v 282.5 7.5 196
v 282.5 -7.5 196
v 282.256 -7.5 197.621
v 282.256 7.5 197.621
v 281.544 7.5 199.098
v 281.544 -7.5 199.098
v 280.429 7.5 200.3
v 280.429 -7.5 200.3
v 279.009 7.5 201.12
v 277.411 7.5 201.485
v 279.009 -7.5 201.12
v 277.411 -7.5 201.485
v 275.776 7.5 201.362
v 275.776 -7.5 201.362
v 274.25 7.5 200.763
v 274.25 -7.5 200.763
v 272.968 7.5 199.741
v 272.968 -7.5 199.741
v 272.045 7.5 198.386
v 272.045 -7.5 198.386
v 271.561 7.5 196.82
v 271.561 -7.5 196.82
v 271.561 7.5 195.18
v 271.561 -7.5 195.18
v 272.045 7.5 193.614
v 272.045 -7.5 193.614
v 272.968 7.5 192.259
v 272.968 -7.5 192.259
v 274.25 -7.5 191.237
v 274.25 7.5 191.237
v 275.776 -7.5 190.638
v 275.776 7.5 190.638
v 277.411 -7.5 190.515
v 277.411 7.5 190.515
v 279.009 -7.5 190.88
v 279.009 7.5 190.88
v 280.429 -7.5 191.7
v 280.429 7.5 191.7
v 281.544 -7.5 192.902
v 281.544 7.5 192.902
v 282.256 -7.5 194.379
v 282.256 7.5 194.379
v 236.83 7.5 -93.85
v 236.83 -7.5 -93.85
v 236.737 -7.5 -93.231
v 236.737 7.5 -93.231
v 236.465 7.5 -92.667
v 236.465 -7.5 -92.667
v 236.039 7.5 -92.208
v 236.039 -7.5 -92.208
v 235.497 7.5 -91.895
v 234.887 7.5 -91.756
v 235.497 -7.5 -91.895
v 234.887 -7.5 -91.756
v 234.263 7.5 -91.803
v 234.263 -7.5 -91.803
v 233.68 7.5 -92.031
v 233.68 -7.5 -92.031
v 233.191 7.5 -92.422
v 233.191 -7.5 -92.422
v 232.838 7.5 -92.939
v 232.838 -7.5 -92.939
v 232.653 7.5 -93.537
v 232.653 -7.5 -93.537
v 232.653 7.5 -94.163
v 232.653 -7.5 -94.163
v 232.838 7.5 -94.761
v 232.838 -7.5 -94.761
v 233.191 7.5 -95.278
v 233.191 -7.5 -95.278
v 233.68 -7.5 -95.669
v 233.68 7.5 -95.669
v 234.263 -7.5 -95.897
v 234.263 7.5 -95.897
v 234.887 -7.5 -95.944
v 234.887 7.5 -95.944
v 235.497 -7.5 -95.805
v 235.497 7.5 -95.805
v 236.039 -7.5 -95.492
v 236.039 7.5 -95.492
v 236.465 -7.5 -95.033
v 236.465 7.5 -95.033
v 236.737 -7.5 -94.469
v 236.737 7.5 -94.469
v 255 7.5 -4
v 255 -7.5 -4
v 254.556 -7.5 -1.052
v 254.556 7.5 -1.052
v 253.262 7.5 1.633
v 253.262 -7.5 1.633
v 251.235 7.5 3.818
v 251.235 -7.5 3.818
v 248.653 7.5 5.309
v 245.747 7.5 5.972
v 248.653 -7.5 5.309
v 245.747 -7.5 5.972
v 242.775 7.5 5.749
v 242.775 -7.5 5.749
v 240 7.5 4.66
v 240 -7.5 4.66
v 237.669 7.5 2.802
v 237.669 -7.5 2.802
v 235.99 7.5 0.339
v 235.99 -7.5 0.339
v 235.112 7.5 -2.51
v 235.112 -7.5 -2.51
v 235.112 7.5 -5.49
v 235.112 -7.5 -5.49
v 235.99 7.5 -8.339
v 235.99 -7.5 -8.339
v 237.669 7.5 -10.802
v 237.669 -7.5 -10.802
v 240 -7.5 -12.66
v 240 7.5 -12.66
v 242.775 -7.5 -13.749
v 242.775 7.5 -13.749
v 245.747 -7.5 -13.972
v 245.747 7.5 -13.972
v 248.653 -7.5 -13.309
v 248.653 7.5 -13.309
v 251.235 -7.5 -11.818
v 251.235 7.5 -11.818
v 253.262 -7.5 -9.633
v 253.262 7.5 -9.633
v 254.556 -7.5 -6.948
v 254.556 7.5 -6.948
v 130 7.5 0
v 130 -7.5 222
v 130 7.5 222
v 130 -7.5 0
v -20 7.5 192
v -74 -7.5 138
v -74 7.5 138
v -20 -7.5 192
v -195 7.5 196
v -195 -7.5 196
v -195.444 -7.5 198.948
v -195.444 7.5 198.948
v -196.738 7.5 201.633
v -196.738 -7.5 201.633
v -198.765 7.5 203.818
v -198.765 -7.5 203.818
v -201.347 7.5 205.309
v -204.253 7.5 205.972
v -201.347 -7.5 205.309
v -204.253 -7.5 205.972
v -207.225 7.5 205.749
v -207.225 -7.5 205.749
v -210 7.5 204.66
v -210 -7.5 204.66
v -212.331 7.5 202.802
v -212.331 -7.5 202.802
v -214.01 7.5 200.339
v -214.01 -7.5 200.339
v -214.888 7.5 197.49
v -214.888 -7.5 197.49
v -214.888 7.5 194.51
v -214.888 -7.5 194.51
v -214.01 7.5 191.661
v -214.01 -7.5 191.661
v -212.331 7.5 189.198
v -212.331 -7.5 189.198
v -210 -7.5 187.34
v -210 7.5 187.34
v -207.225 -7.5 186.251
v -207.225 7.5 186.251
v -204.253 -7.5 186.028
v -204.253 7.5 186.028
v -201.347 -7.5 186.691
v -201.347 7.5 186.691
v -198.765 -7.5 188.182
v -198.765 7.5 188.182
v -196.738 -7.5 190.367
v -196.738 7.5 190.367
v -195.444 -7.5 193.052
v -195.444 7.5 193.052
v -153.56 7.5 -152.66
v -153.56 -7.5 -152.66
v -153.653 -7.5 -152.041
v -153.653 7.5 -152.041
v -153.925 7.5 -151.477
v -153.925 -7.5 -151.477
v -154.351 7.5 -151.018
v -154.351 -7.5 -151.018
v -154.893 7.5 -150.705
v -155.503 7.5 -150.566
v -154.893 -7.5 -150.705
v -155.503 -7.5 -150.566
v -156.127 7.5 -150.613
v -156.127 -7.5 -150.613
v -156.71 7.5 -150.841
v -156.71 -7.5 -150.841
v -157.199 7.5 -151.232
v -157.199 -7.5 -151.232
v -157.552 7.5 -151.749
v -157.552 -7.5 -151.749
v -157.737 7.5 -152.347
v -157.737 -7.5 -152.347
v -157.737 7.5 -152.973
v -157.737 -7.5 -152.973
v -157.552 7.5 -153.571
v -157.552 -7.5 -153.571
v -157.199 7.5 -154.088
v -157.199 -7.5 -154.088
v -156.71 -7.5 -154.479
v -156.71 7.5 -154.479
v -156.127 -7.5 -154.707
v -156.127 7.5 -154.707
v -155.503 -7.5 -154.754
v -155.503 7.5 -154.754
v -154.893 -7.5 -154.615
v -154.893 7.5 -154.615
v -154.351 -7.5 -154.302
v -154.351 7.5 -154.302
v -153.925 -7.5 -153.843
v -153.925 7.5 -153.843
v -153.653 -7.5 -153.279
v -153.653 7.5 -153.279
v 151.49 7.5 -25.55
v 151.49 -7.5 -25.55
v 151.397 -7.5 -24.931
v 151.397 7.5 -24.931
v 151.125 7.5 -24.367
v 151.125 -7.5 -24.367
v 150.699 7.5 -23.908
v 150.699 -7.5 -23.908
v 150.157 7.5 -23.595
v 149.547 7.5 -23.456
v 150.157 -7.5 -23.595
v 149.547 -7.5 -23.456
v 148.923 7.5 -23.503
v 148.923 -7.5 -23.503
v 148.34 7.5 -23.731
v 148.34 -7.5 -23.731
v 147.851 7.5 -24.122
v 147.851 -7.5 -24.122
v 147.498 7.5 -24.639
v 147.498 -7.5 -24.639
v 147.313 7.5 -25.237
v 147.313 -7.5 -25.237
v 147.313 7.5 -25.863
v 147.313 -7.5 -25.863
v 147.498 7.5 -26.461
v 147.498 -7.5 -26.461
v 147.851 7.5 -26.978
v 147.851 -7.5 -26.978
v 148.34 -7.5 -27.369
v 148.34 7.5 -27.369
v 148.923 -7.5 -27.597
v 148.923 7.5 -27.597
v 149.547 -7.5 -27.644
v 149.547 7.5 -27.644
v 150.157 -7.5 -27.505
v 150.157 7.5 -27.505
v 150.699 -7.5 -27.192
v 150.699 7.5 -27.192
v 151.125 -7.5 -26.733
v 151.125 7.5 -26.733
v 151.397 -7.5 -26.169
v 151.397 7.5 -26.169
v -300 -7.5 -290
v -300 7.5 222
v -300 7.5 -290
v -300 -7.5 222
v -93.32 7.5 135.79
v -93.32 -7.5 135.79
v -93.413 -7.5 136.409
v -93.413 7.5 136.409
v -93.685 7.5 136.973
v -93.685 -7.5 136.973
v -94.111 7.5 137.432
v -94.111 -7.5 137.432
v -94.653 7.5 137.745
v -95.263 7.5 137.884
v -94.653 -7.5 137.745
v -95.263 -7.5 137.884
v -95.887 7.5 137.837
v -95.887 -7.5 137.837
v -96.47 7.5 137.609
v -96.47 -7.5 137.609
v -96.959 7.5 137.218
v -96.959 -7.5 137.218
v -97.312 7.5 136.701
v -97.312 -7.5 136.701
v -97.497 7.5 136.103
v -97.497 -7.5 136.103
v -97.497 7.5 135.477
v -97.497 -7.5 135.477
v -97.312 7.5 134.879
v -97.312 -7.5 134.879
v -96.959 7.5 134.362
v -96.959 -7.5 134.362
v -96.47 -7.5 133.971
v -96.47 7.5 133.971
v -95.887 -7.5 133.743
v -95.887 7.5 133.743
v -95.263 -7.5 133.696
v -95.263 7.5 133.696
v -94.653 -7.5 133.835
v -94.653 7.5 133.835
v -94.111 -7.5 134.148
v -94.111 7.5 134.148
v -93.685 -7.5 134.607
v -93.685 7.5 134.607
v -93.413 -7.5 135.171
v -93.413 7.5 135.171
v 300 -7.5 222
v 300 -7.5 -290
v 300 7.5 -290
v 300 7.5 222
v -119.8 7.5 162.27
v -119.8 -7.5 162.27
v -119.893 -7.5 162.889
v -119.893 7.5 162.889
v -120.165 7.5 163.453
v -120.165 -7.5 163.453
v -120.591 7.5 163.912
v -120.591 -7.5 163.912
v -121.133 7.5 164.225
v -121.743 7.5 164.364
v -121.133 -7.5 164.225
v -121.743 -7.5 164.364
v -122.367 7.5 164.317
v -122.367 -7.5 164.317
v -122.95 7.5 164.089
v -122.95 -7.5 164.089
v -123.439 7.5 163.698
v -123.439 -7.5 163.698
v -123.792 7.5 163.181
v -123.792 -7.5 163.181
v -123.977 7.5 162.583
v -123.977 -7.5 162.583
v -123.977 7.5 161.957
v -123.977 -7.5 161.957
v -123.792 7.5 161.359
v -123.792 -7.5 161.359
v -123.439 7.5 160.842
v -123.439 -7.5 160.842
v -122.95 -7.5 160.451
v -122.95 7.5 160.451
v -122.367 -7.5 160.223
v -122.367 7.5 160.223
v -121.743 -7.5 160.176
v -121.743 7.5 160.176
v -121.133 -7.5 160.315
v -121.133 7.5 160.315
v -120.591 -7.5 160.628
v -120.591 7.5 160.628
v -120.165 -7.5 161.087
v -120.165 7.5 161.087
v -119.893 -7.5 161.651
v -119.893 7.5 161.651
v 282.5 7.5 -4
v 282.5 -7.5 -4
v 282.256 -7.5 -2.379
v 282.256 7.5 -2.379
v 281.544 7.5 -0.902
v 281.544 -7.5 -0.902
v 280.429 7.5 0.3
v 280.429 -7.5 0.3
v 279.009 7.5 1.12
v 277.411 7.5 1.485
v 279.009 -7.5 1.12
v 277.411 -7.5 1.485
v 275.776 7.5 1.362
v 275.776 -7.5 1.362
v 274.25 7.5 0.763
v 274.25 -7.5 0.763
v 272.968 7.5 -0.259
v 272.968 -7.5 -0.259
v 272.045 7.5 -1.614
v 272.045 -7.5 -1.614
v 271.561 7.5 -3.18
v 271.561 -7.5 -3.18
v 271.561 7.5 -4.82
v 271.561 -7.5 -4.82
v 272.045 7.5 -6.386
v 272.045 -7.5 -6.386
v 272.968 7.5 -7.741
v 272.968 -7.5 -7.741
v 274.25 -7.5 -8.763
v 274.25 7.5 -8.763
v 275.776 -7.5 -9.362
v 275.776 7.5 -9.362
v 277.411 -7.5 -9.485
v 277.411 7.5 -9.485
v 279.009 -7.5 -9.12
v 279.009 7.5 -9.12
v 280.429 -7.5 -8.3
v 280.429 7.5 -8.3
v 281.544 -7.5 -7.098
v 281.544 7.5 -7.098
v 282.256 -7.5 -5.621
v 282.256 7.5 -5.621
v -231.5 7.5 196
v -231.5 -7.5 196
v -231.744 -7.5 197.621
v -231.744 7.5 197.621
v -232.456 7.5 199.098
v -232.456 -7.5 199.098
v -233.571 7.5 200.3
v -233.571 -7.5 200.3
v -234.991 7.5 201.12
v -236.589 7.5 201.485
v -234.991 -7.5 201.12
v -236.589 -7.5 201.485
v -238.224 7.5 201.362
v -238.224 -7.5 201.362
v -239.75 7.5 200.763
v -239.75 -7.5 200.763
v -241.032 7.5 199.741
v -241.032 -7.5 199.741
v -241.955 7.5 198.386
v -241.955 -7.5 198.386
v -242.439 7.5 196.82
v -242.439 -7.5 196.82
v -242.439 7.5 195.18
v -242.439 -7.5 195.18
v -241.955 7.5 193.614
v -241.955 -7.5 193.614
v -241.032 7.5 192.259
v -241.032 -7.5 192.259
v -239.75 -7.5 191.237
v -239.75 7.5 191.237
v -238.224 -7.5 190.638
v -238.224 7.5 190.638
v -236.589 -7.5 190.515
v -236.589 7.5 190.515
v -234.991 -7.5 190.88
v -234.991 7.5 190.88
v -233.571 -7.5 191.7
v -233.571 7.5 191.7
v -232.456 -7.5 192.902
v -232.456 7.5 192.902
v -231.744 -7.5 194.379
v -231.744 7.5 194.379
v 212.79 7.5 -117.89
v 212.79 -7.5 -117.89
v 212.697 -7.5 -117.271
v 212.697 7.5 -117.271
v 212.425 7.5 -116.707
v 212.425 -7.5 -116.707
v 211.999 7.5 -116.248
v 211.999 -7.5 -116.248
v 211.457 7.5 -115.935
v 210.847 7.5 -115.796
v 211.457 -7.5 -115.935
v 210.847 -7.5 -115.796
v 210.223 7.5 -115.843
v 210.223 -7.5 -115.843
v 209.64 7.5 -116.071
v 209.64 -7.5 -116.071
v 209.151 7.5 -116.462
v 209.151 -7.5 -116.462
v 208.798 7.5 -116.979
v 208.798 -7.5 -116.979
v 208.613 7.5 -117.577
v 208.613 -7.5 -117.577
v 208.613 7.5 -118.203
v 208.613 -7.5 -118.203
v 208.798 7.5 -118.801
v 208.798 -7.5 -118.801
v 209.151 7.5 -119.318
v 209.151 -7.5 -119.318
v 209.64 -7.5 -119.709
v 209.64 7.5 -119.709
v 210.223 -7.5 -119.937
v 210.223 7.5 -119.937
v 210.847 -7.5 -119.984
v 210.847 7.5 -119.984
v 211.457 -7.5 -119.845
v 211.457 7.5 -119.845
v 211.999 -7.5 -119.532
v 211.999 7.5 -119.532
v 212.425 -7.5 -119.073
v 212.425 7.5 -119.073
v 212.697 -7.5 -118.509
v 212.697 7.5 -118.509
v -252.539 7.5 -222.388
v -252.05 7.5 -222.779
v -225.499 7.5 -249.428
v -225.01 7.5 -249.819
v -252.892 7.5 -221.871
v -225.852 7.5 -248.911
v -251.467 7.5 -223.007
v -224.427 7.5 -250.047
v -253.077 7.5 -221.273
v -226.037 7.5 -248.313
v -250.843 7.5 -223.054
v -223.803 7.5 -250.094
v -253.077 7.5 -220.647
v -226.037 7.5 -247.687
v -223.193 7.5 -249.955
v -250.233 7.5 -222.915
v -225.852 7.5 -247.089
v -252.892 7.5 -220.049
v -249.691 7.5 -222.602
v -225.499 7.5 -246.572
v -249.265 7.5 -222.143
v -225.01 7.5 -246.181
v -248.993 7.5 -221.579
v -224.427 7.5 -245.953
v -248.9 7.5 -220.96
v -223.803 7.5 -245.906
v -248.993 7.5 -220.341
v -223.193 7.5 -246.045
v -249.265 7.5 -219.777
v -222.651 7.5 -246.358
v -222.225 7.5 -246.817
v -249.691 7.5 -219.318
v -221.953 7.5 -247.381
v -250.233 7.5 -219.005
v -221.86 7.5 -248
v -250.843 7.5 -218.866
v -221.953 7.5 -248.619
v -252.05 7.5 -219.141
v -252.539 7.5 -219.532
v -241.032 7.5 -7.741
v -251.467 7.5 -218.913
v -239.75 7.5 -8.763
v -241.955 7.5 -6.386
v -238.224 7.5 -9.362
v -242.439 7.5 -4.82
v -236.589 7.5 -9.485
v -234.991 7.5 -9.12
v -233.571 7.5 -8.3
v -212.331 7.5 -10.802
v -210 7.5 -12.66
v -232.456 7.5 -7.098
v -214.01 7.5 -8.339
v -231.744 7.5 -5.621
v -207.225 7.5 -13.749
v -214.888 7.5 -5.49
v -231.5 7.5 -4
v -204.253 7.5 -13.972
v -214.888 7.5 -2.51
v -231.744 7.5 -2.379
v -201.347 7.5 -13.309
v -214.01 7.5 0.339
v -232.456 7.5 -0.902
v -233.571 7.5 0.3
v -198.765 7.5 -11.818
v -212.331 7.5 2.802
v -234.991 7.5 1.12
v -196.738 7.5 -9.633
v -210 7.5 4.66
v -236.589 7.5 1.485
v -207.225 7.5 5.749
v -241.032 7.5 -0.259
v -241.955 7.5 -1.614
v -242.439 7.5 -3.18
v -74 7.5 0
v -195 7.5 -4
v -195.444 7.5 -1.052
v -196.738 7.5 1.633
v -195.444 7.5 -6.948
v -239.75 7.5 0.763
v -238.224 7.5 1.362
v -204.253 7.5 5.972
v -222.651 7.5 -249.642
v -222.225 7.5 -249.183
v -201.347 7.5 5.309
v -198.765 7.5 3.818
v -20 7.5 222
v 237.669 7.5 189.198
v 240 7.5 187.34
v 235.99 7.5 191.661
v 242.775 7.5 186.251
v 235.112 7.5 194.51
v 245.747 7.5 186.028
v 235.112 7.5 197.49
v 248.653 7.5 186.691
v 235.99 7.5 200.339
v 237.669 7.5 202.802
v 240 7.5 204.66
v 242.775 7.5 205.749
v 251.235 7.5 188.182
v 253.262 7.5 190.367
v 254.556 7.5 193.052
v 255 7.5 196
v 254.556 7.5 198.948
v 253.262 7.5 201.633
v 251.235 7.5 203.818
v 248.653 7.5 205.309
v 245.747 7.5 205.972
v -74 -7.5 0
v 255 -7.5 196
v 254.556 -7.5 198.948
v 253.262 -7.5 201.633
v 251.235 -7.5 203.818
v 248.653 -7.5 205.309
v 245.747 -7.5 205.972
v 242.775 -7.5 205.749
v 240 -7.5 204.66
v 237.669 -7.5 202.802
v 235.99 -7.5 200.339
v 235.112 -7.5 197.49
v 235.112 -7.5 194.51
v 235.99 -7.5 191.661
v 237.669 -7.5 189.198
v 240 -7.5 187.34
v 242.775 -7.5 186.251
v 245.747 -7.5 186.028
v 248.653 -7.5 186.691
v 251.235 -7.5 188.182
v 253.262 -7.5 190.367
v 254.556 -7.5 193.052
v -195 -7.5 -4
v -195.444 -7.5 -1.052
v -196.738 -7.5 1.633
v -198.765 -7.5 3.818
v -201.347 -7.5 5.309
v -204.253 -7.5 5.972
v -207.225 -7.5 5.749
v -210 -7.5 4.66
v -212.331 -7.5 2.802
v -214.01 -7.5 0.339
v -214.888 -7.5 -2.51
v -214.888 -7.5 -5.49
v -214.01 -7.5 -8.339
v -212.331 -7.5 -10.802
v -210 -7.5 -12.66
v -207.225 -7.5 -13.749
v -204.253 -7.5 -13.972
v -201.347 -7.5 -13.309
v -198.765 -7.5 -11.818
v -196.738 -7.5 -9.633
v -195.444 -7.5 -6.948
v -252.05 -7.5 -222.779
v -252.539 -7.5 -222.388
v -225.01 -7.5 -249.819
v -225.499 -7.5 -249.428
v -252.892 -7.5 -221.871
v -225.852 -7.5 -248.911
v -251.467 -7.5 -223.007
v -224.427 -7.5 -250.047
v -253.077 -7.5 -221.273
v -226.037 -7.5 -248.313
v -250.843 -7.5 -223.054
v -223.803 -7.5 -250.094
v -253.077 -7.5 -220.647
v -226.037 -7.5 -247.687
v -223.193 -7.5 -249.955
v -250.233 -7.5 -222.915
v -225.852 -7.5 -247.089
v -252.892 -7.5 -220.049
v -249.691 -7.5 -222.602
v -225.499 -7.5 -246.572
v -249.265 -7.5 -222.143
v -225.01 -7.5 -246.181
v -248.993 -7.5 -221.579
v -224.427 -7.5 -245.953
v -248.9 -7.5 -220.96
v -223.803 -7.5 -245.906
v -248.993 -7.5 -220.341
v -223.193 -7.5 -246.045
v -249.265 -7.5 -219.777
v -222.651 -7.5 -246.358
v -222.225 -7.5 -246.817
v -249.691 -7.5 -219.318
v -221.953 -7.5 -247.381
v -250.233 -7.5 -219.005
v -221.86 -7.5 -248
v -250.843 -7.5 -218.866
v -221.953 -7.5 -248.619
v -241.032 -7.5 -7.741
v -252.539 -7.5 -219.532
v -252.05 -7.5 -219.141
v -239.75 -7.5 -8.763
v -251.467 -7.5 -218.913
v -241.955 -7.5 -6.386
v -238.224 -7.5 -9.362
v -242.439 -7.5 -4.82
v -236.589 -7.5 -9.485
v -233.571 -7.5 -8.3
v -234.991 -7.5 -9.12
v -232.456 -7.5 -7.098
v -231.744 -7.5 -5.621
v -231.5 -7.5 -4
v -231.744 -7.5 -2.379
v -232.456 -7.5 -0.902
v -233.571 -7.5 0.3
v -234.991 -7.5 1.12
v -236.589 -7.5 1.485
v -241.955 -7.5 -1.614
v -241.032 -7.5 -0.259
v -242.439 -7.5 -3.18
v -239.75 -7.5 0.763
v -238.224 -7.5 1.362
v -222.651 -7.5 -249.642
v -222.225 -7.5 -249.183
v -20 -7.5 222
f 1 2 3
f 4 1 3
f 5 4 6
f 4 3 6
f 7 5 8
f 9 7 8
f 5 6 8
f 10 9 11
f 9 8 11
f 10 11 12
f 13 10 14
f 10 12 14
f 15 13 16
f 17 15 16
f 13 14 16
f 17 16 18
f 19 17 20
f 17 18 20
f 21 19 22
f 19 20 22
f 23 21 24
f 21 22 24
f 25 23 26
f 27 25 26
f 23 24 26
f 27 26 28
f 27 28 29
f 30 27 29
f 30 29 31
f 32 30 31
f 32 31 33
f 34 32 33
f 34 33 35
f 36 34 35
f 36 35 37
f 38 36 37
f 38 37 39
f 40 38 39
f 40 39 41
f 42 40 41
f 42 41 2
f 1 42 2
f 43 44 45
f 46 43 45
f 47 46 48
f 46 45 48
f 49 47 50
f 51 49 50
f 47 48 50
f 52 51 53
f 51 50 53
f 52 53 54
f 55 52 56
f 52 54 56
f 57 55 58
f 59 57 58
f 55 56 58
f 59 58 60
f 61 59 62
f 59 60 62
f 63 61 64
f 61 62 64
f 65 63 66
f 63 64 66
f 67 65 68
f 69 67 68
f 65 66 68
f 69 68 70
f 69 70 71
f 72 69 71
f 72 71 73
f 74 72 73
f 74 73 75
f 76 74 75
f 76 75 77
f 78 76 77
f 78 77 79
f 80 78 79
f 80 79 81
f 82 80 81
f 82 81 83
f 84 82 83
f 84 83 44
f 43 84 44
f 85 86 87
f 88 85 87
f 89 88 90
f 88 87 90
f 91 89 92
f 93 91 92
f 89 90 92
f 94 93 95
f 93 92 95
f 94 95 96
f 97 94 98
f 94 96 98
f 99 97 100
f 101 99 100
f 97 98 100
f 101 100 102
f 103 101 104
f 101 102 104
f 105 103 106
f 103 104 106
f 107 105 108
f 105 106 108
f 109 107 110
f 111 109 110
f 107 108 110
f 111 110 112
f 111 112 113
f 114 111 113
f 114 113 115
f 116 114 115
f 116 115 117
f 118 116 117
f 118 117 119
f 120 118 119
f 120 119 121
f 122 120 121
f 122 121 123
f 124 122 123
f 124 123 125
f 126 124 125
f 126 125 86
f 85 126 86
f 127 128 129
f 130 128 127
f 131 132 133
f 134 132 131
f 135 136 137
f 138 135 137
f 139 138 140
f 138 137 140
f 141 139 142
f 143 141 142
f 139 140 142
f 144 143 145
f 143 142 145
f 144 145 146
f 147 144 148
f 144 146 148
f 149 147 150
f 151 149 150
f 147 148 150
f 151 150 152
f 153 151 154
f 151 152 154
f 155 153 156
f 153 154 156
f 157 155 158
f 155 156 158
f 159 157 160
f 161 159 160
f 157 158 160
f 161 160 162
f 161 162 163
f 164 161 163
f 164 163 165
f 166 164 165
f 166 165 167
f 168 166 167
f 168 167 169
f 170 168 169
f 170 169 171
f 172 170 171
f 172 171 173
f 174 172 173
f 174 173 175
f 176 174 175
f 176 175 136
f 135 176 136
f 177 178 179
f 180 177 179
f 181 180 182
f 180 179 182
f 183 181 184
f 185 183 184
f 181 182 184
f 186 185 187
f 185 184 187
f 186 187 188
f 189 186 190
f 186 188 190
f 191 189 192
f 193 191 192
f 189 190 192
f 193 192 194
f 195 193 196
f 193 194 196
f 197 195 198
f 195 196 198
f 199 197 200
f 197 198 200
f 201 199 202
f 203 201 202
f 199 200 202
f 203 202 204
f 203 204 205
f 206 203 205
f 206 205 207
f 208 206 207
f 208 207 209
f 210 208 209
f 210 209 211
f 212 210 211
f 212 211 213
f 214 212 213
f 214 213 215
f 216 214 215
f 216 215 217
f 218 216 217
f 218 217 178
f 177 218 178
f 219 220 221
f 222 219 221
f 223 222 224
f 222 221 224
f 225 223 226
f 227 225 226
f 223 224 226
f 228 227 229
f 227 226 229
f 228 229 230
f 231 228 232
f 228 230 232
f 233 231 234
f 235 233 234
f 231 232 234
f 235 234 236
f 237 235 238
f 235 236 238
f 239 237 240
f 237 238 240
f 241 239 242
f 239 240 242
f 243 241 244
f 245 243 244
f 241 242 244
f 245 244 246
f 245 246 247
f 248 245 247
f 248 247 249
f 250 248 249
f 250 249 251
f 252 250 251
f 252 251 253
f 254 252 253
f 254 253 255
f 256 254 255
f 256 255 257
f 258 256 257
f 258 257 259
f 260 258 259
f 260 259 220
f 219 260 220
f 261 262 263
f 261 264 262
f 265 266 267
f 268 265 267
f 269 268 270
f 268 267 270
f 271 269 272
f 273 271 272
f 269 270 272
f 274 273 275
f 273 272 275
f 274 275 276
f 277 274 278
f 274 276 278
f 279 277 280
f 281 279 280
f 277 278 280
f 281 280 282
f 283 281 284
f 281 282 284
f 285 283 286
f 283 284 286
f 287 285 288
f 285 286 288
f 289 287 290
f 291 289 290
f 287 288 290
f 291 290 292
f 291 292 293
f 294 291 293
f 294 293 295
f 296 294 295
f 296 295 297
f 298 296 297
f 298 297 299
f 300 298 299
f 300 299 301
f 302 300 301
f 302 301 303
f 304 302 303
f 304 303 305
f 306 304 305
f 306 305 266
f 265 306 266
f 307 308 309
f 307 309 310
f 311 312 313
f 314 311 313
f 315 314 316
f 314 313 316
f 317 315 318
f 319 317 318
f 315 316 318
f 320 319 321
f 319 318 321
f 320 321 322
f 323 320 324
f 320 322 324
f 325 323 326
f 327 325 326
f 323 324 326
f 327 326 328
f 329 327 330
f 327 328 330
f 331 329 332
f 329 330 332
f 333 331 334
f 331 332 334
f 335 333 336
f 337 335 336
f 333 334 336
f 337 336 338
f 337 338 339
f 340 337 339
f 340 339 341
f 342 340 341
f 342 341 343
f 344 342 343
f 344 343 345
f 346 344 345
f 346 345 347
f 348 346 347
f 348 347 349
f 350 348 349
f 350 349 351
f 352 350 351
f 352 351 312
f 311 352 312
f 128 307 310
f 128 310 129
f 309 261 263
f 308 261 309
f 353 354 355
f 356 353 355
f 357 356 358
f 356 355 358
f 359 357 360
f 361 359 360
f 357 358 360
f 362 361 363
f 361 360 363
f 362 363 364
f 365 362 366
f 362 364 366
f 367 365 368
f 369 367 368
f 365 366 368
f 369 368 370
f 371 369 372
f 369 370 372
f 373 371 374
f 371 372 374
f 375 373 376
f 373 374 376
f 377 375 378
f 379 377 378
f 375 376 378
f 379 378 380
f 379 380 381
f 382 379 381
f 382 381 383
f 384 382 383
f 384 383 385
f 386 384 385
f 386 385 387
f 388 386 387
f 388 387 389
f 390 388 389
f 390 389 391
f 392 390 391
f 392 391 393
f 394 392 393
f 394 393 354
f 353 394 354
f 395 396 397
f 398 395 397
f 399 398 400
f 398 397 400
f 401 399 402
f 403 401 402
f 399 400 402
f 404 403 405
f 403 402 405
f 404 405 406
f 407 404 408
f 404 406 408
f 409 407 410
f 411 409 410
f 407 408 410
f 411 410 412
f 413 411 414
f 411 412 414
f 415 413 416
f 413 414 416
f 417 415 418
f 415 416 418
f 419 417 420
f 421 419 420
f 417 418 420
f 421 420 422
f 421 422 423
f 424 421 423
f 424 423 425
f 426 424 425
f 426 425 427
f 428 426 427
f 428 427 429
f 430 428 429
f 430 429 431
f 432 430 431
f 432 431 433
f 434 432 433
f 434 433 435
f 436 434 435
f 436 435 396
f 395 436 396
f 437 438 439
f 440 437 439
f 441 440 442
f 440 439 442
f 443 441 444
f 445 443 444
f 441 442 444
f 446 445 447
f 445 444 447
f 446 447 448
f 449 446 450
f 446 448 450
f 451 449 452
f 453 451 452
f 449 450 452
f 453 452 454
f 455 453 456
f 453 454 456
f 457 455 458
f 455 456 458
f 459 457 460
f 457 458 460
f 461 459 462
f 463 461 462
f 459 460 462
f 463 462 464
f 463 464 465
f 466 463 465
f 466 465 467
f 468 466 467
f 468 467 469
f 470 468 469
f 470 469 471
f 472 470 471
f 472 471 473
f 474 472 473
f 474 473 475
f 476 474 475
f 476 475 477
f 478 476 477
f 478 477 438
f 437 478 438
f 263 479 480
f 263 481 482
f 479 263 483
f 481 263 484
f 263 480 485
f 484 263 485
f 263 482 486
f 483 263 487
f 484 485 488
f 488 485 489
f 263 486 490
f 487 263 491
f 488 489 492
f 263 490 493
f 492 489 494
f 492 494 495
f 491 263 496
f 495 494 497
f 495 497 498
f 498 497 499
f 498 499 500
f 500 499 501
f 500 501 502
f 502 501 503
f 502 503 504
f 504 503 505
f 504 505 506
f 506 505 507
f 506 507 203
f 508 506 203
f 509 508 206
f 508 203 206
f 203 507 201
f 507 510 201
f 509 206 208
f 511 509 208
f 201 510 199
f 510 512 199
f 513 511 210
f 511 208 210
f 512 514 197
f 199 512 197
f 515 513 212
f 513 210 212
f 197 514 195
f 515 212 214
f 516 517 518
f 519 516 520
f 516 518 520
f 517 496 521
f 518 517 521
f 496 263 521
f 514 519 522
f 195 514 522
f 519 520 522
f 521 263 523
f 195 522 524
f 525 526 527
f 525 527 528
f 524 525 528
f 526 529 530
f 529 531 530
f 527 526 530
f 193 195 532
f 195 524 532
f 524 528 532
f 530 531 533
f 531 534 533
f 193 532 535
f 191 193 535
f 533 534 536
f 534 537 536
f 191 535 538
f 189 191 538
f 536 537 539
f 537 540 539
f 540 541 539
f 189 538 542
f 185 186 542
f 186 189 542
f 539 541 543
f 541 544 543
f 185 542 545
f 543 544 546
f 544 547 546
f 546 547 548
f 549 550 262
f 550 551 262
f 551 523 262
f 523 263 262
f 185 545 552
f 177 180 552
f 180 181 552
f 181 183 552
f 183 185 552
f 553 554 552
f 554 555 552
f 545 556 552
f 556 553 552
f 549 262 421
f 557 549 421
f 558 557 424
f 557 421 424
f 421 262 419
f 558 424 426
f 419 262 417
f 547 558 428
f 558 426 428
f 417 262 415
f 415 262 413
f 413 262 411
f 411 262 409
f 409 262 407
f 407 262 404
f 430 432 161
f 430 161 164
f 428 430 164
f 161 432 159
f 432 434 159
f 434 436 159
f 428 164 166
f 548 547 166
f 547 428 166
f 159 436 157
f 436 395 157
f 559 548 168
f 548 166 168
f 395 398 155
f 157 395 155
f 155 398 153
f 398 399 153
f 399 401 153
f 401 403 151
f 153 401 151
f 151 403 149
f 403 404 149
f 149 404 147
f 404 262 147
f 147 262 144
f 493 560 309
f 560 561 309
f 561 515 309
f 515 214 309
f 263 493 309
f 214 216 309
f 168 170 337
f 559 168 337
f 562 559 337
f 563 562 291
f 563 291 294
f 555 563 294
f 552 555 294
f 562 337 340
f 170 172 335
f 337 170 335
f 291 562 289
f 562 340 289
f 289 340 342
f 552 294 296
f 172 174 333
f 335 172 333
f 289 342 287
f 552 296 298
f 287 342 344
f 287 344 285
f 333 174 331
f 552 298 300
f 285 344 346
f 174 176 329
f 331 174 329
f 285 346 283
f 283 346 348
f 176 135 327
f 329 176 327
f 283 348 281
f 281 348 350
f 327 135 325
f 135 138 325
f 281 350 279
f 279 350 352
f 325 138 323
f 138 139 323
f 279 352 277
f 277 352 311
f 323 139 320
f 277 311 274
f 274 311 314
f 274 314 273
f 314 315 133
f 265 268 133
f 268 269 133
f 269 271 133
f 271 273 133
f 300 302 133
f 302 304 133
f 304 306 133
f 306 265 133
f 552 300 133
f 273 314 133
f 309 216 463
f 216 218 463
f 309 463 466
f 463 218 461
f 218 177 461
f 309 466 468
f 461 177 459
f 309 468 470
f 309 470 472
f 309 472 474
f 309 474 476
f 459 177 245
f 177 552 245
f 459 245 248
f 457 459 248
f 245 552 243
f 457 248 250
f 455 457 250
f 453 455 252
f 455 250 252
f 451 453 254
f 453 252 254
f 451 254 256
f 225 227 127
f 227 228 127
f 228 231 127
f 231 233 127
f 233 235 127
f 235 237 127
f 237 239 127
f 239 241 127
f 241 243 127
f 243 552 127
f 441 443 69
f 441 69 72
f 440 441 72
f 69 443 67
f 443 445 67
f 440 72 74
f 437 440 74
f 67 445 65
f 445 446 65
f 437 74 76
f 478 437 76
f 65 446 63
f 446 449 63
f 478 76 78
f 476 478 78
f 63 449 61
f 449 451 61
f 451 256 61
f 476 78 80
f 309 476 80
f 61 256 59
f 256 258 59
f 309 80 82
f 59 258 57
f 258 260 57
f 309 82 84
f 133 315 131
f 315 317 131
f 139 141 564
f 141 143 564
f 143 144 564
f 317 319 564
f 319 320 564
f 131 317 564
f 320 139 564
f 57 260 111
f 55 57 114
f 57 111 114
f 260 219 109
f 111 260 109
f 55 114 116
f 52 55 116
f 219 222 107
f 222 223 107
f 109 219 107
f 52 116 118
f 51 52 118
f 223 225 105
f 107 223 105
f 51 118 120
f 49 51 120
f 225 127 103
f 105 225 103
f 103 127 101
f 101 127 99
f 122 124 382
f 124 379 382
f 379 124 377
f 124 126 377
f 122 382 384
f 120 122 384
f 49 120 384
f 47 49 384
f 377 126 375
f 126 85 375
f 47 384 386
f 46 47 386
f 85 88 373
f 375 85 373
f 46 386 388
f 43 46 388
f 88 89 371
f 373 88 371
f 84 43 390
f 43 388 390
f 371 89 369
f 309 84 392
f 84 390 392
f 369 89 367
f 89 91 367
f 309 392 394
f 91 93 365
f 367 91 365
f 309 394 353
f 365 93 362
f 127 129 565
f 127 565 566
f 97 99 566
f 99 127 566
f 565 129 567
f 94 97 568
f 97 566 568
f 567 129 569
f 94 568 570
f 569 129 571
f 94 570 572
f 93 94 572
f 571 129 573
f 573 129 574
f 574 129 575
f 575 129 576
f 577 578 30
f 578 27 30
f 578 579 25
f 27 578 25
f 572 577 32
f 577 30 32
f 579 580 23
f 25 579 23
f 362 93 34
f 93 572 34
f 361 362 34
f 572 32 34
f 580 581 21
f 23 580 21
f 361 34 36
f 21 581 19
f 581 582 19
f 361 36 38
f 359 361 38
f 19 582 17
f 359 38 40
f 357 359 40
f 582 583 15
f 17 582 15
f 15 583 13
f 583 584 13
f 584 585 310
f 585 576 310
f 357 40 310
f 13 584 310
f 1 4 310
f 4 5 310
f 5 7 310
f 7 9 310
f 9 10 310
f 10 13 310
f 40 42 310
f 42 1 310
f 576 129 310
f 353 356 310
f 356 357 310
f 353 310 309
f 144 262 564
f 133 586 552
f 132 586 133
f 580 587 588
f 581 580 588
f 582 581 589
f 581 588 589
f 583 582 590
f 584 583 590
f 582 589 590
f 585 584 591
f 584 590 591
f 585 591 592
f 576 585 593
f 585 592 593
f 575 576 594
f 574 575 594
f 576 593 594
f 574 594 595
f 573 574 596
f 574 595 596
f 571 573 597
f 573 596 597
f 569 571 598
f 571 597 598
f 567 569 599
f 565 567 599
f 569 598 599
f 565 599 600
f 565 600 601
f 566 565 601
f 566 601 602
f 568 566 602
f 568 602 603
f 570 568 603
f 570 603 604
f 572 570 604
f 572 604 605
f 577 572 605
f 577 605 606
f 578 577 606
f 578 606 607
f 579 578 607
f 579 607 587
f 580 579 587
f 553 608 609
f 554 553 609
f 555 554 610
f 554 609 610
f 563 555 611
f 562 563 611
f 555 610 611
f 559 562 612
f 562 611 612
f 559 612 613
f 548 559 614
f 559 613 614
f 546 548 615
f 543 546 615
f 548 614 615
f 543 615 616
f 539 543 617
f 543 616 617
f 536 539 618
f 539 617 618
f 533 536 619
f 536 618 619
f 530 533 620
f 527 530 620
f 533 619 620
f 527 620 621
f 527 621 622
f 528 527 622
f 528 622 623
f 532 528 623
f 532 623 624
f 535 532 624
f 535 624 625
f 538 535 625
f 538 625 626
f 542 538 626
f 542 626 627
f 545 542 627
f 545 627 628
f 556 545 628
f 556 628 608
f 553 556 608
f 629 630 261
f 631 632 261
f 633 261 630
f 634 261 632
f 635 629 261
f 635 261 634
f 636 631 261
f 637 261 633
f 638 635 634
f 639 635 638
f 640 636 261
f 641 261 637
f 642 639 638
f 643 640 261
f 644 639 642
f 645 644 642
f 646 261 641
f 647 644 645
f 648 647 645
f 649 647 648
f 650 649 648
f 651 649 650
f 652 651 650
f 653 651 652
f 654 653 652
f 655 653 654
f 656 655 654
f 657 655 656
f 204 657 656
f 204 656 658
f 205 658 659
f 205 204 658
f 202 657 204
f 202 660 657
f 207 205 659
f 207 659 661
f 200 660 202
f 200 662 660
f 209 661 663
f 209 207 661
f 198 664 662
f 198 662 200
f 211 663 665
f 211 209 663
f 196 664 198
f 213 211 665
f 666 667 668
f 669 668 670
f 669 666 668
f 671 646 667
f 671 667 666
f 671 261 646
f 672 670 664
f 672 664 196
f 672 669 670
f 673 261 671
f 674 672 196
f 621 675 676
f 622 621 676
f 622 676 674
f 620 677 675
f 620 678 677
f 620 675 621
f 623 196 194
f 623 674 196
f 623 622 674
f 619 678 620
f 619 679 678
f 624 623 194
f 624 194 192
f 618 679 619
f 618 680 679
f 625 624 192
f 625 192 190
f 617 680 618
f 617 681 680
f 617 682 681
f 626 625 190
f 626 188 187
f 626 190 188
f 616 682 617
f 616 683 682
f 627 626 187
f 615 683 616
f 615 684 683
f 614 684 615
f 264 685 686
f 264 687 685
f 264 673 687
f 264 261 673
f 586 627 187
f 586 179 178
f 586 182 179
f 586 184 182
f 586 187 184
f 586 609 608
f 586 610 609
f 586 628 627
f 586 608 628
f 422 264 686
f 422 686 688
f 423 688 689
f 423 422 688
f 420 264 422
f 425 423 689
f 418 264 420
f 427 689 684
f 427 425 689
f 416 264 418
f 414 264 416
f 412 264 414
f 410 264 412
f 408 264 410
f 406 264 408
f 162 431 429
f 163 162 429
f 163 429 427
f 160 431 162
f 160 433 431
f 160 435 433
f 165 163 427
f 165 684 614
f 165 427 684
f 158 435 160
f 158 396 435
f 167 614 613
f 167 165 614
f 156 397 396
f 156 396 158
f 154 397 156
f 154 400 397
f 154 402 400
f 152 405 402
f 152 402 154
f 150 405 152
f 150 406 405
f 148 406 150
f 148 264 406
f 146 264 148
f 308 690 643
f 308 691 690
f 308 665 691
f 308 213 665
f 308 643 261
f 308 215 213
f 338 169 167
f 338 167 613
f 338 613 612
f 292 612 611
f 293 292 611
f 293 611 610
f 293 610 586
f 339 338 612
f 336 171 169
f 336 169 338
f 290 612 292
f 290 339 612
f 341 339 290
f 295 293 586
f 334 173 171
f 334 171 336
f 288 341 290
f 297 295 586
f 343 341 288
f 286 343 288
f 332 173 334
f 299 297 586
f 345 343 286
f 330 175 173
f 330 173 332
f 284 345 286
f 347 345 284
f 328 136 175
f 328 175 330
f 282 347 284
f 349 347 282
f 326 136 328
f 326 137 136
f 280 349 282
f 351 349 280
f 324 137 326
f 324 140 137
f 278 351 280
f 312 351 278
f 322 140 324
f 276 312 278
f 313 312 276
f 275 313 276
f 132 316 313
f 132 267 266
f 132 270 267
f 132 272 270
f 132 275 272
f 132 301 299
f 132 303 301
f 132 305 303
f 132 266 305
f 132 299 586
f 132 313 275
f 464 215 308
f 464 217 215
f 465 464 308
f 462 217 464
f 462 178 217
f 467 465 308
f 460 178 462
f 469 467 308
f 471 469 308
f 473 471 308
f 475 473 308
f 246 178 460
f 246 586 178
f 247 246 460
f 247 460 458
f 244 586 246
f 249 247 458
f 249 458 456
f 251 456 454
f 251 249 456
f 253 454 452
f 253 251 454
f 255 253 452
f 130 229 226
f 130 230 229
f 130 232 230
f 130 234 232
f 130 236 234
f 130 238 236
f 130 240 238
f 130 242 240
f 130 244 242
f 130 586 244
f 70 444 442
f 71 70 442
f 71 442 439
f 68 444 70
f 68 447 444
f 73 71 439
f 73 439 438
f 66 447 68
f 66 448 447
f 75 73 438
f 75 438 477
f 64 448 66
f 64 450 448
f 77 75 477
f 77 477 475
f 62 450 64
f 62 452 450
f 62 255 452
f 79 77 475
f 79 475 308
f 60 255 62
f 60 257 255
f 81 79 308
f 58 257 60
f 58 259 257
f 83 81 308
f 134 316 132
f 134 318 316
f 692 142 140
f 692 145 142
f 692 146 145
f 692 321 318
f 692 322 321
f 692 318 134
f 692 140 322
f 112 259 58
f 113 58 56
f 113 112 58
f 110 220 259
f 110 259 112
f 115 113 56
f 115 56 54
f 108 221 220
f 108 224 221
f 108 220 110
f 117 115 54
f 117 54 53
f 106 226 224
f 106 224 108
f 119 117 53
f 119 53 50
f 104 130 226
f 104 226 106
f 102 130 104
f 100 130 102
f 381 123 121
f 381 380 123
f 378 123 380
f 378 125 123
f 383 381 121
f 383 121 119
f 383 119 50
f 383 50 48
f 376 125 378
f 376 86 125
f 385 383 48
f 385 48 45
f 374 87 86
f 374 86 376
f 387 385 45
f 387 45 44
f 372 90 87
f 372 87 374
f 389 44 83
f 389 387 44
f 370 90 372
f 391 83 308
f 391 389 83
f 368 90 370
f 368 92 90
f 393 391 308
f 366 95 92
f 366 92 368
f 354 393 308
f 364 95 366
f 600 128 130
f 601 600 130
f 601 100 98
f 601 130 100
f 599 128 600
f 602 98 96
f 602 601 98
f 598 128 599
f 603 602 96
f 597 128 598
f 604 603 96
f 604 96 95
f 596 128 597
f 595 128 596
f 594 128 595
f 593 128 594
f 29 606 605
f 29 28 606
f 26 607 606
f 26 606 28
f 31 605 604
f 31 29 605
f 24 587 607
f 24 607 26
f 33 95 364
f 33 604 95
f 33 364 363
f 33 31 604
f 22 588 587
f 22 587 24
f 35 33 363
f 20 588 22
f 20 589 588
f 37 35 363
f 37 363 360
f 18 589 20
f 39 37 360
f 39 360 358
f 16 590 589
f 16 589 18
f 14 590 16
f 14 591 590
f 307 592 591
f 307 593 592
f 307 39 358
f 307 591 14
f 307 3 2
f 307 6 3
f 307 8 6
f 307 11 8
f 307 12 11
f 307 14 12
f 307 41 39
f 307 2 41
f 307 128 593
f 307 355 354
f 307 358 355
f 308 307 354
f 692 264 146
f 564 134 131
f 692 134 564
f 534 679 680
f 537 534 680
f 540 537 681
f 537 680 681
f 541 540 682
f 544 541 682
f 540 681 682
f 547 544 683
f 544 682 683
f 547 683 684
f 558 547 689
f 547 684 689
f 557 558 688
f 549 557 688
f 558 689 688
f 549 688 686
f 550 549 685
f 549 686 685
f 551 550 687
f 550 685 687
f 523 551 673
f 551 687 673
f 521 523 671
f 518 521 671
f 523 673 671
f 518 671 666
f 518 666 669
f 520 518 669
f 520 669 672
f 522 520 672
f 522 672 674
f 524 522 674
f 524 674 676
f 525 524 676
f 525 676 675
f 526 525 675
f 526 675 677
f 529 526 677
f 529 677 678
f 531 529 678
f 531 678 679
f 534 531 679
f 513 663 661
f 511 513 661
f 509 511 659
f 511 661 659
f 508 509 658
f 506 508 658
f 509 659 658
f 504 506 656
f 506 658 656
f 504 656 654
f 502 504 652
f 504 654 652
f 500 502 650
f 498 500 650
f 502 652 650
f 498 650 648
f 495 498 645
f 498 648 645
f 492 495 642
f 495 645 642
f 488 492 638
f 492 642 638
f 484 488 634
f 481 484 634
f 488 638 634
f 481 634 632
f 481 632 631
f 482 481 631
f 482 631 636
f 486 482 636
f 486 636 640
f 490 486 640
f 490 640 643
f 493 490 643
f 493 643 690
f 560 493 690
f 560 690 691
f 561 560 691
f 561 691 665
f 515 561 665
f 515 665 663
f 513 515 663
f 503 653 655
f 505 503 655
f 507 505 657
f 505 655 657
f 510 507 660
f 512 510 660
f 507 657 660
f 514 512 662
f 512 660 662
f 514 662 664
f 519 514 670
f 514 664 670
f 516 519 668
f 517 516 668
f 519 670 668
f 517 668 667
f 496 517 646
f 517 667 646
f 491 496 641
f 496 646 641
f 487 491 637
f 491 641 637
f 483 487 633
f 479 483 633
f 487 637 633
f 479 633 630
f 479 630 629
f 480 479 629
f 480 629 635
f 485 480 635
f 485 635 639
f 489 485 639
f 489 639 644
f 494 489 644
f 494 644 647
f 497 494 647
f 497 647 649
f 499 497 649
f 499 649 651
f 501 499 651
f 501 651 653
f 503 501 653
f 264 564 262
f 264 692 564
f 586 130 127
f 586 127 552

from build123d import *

# Parameters (mm, degrees)
F1_DEPTH = 7.5
F3_D     = 20
F5_D     = 4.2
F7_D     = 11


with BuildPart() as f1:
    # F0 (on Front) → F1 (new body, symmetric)
    with BuildSketch(Plane.XZ):
        Polygon((-300, 222), (-300, -290), (300, -290), (300, 222), (130, 222), (130, 0), (-74, 0), (-74, 138), (-20, 192), (-20, 222), align=None)
    extrude(amount=F1_DEPTH, both=True)

    # F3 (through all)
    with Locations(Plane(origin=(0, 7.5, 0), x_dir=(-1, 0, 0), z_dir=(0, 1, 0))):
        with Locations((-245, 196), (205, 196), (-245, -4), (205, -4)):
            Hole(F3_D / 2)

    # F5 (through all)
    with Locations(Plane(origin=(0, 7.5, 0), x_dir=(-1, 0, 0), z_dir=(0, 1, 0))):
        with Locations((-210.69, -117.89), (-234.73, -93.85), (-149.39, -25.55), (155.66, -152.66), (223.96, -248), (251, -220.96), (95.42, 135.79), (121.9, 162.27)):
            Hole(F5_D / 2)

    # F7 (through all)
    with Locations(Plane(origin=(0, 7.5, 0), x_dir=(-1, 0, 0), z_dir=(0, 1, 0))):
        with Locations((-277, 196), (-277, -4), (237, 196), (237, -4)):
            Hole(F7_D / 2)


solid = f1.part
